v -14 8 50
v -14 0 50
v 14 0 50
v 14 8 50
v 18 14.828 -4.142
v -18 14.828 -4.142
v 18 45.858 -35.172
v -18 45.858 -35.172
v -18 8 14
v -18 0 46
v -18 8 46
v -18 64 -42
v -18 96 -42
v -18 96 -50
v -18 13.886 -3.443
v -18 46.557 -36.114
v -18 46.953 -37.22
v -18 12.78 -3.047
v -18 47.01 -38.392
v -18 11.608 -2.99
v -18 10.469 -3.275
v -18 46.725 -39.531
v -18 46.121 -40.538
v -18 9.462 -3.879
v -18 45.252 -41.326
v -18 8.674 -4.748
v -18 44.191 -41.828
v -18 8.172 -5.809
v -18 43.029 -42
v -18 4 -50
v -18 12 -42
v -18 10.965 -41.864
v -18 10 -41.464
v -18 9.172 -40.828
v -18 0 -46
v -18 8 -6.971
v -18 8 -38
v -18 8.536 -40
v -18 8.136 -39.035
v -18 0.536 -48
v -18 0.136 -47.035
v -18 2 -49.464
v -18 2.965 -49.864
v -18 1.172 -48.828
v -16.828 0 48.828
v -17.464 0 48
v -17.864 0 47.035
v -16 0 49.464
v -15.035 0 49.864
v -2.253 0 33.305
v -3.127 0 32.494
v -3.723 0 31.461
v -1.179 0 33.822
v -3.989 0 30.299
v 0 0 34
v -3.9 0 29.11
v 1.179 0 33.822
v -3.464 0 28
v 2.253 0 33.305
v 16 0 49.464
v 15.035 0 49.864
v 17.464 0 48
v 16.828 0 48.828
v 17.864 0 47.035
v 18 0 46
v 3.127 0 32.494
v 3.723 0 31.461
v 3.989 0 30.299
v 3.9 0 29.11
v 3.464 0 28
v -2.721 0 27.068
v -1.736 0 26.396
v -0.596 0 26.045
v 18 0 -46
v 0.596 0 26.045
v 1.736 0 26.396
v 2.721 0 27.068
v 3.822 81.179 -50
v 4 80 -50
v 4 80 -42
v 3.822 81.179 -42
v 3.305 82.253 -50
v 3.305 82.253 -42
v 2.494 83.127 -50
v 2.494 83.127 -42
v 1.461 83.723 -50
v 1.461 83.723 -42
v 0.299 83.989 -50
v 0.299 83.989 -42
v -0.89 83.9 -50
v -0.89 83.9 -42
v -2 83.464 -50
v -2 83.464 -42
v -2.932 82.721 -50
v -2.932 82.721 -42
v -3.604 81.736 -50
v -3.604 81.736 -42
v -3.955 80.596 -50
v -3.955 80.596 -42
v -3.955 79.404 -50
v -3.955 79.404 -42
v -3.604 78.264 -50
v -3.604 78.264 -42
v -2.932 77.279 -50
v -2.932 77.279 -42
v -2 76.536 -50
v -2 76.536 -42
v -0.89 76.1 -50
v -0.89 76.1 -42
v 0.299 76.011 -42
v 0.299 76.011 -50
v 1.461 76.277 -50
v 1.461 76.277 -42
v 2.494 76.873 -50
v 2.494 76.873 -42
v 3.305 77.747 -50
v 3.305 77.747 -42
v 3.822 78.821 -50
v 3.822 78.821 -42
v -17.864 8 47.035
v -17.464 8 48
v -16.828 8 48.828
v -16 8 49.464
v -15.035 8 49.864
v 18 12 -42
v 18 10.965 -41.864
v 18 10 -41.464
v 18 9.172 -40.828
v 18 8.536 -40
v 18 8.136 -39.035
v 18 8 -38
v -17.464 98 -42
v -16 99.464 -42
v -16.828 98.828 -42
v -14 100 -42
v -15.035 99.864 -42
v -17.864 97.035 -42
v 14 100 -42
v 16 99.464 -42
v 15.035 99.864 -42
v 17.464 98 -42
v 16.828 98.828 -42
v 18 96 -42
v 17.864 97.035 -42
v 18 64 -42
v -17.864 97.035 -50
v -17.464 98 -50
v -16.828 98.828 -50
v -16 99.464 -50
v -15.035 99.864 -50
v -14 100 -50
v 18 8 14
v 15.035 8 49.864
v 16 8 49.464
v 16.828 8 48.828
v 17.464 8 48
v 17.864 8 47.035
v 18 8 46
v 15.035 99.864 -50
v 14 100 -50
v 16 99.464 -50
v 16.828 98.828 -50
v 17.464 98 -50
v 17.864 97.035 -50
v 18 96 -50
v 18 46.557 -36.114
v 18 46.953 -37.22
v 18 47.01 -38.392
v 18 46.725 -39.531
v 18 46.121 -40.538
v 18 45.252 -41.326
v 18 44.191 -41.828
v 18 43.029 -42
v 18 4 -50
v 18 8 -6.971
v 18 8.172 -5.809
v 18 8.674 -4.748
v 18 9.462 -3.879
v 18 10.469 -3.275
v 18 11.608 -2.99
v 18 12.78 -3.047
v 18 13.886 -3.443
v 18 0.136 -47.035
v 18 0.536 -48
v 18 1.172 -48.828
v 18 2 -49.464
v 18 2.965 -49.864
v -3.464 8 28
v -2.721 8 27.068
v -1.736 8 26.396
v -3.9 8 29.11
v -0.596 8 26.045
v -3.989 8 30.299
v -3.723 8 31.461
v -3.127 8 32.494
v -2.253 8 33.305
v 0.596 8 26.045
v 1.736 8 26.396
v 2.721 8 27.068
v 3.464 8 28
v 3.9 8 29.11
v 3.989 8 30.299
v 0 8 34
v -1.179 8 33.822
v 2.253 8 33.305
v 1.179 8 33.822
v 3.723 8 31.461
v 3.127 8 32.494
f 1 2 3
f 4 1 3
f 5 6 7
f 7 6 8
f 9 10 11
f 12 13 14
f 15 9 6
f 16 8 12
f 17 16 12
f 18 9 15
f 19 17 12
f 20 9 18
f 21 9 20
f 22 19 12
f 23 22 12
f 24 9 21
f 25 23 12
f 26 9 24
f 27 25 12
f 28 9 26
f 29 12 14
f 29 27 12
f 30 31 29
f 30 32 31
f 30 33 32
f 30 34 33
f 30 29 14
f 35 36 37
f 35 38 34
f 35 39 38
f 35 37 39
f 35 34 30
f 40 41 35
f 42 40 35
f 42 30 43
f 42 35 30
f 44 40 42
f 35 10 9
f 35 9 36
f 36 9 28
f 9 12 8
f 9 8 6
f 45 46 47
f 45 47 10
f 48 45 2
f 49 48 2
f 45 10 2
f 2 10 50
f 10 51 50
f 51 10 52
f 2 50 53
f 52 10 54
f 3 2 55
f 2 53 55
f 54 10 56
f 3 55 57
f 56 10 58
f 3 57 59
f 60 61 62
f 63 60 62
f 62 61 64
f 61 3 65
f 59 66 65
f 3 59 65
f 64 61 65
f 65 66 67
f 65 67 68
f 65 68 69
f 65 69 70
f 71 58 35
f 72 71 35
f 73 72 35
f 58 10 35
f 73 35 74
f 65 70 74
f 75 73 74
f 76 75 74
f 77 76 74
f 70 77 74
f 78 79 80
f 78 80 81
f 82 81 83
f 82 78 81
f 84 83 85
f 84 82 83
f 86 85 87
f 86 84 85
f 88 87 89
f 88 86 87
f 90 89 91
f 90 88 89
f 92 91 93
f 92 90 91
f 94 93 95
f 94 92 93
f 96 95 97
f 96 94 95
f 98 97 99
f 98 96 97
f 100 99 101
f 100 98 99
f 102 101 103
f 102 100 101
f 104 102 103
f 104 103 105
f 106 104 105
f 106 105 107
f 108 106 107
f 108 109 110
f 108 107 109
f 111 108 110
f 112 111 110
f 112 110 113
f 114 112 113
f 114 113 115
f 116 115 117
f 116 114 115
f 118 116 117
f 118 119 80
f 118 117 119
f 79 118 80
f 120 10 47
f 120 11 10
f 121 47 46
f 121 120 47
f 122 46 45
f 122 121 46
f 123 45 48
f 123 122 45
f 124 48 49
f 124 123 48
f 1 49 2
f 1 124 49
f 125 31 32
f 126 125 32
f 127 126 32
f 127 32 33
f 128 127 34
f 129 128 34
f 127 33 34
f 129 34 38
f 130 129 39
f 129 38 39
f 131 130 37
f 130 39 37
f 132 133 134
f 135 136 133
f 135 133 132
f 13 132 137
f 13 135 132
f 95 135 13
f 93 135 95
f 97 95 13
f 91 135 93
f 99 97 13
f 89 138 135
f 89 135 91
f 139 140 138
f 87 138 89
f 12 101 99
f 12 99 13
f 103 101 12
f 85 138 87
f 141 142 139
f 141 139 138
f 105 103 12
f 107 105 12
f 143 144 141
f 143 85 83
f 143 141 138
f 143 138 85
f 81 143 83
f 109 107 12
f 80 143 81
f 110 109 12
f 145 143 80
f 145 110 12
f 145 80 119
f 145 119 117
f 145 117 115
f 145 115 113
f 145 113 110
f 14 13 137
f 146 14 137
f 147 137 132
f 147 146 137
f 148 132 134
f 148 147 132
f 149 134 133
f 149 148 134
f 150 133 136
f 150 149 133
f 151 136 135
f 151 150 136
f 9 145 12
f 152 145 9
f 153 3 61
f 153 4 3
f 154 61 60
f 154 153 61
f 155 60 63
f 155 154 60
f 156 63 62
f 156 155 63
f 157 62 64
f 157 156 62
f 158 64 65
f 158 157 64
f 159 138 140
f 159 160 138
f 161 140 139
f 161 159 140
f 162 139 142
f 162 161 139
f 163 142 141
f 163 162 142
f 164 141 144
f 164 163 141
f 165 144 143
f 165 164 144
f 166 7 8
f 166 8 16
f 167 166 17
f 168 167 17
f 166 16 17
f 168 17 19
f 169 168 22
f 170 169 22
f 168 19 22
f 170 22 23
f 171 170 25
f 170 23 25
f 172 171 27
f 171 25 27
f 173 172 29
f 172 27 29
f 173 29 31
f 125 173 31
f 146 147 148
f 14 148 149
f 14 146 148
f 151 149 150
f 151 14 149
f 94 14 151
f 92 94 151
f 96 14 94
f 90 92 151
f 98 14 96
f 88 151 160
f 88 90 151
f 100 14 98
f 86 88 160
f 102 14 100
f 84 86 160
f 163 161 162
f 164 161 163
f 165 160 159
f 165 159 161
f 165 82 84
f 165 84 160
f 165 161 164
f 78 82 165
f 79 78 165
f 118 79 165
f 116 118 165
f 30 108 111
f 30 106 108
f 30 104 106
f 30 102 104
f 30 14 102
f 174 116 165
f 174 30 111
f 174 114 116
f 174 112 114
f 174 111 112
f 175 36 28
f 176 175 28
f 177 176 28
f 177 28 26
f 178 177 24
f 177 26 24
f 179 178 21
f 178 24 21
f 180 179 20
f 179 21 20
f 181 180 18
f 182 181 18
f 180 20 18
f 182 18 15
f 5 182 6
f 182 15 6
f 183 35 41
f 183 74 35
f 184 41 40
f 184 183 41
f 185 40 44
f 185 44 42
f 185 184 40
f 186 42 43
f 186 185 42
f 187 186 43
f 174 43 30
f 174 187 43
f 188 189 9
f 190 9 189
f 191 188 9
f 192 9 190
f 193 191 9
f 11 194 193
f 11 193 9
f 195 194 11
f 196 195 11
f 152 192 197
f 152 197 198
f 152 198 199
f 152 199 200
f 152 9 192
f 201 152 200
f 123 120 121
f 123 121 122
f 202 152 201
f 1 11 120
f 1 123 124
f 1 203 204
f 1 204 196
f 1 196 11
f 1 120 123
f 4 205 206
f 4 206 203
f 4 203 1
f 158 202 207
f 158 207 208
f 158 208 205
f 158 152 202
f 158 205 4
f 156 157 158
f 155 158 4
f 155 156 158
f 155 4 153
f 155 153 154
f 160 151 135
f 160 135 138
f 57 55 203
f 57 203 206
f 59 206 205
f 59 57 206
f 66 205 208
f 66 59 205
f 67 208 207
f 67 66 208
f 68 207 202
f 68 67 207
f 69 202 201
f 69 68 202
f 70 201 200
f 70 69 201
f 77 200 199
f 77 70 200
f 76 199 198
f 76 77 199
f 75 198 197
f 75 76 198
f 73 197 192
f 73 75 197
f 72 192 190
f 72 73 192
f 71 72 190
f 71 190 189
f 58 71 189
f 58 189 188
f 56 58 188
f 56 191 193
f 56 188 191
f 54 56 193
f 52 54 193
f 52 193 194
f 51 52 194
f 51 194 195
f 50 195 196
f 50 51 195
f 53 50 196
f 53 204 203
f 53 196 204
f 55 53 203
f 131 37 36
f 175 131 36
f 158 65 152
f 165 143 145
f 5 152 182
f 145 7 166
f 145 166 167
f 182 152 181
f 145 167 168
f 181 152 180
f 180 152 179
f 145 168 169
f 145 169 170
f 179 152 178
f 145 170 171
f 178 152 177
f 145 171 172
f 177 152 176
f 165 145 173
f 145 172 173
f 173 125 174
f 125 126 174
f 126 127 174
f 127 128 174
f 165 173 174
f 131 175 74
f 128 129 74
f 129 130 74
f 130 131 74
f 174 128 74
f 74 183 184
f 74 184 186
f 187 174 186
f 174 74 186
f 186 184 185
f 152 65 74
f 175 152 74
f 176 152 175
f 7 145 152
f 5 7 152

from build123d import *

# Parameters (mm, degrees)
SKETCH1_W               = 36
SKETCH1_H               = 100
BOSS_EXTRUDE1_DEPTH     = 100
CUT_EXTRUDE1_DEPTH      = 118.45637488
CUT_EXTRUDE1_DEPTH_BACK = 118.45637488
CUT_EXTRUDE5_DEPTH      = 118.45637488
CUT_EXTRUDE5_DEPTH_BACK = 118.45637488
FILLET3_R               = 4
CUT_EXTRUDE6_DEPTH      = 107.244999882
CUT_EXTRUDE6_DEPTH_BACK = 107.244999882
SKETCH9_R               = 4
CUT_EXTRUDE7_DEPTH      = 138.069325525
CUT_EXTRUDE7_DEPTH_BACK = 138.069325525
SKETCH10_R              = 4


with BuildPart() as part:
    # Sketch1 → Boss-Extrude1 (new body)
    with BuildSketch(Plane(origin=(0, 0, 0), x_dir=(1, 0, 0), z_dir=(0, 1, 0))):
        Rectangle(SKETCH1_W, SKETCH1_H)
    extrude(amount=BOSS_EXTRUDE1_DEPTH)

    # Sketch2 → Cut-Extrude1 (cut, two sides: drawn at the far end of the back side and taken through both)
    with BuildSketch(Plane.ZY.offset(18).offset(-CUT_EXTRUDE1_DEPTH_BACK)):
        Polygon((50, 100), (-42, 100), (-42, 64), (14, 8), (50, 8), align=None)
    extrude(amount=CUT_EXTRUDE1_DEPTH + CUT_EXTRUDE1_DEPTH_BACK, mode=Mode.SUBTRACT)

    # Sketch8 → Cut-Extrude5 (cut, two sides: drawn at the far end of the back side and taken through both)
    with BuildSketch(Plane(origin=(18, 0, 0), x_dir=(0, 0, -1), z_dir=(1, 0, 0)).offset(-CUT_EXTRUDE5_DEPTH_BACK)):
        with BuildLine():
            Line((42, 43.029437252), (42, 12))
            ThreePointArc((42, 12), (40.828427125, 9.171572875), (38, 8))
            Line((38, 8), (6.970562748, 8))
            ThreePointArc((6.970562748, 8), (3.275044618, 10.469266271), (4.142135624, 14.828427125))
            Line((4.142135624, 14.828427125), (35.171572875, 45.857864376))
            ThreePointArc((35.171572875, 45.857864376), (39.530733729, 46.724955382), (42, 43.029437252))
        make_face()
    extrude(amount=CUT_EXTRUDE5_DEPTH + CUT_EXTRUDE5_DEPTH_BACK, mode=Mode.SUBTRACT)

    # Fillet3
    fillet3_edges = [part.edges().sort_by_distance(p)[0] for p in [
        (-18, 100, -46),
        (18, 100, -46),
        (18, 4, 50),
        (-18, 4, 50),
        (0, 0, -50),
    ]]
    fillet(fillet3_edges, radius=FILLET3_R)

    # Sketch9 → Cut-Extrude6 (cut, two sides: drawn at the far end of the back side and taken through both)
    with BuildSketch(Plane(origin=(0, 8, 0), x_dir=(1, 0, 0), z_dir=(0, 1, 0)).offset(-CUT_EXTRUDE6_DEPTH_BACK)):
        with Locations(Location((0, -30, 0), (0, 0, 270))):
            Circle(SKETCH9_R)
    extrude(amount=CUT_EXTRUDE6_DEPTH + CUT_EXTRUDE6_DEPTH_BACK, mode=Mode.SUBTRACT)

    # Sketch10 → Cut-Extrude7 (cut, two sides: drawn at the far end of the back side and taken through both)
    with BuildSketch(Plane.XY.offset(-42).offset(-CUT_EXTRUDE7_DEPTH_BACK)):
        with Locations((0, 80)):
            Circle(SKETCH10_R)
    extrude(amount=CUT_EXTRUDE7_DEPTH + CUT_EXTRUDE7_DEPTH_BACK, mode=Mode.SUBTRACT)


solid = part.part
